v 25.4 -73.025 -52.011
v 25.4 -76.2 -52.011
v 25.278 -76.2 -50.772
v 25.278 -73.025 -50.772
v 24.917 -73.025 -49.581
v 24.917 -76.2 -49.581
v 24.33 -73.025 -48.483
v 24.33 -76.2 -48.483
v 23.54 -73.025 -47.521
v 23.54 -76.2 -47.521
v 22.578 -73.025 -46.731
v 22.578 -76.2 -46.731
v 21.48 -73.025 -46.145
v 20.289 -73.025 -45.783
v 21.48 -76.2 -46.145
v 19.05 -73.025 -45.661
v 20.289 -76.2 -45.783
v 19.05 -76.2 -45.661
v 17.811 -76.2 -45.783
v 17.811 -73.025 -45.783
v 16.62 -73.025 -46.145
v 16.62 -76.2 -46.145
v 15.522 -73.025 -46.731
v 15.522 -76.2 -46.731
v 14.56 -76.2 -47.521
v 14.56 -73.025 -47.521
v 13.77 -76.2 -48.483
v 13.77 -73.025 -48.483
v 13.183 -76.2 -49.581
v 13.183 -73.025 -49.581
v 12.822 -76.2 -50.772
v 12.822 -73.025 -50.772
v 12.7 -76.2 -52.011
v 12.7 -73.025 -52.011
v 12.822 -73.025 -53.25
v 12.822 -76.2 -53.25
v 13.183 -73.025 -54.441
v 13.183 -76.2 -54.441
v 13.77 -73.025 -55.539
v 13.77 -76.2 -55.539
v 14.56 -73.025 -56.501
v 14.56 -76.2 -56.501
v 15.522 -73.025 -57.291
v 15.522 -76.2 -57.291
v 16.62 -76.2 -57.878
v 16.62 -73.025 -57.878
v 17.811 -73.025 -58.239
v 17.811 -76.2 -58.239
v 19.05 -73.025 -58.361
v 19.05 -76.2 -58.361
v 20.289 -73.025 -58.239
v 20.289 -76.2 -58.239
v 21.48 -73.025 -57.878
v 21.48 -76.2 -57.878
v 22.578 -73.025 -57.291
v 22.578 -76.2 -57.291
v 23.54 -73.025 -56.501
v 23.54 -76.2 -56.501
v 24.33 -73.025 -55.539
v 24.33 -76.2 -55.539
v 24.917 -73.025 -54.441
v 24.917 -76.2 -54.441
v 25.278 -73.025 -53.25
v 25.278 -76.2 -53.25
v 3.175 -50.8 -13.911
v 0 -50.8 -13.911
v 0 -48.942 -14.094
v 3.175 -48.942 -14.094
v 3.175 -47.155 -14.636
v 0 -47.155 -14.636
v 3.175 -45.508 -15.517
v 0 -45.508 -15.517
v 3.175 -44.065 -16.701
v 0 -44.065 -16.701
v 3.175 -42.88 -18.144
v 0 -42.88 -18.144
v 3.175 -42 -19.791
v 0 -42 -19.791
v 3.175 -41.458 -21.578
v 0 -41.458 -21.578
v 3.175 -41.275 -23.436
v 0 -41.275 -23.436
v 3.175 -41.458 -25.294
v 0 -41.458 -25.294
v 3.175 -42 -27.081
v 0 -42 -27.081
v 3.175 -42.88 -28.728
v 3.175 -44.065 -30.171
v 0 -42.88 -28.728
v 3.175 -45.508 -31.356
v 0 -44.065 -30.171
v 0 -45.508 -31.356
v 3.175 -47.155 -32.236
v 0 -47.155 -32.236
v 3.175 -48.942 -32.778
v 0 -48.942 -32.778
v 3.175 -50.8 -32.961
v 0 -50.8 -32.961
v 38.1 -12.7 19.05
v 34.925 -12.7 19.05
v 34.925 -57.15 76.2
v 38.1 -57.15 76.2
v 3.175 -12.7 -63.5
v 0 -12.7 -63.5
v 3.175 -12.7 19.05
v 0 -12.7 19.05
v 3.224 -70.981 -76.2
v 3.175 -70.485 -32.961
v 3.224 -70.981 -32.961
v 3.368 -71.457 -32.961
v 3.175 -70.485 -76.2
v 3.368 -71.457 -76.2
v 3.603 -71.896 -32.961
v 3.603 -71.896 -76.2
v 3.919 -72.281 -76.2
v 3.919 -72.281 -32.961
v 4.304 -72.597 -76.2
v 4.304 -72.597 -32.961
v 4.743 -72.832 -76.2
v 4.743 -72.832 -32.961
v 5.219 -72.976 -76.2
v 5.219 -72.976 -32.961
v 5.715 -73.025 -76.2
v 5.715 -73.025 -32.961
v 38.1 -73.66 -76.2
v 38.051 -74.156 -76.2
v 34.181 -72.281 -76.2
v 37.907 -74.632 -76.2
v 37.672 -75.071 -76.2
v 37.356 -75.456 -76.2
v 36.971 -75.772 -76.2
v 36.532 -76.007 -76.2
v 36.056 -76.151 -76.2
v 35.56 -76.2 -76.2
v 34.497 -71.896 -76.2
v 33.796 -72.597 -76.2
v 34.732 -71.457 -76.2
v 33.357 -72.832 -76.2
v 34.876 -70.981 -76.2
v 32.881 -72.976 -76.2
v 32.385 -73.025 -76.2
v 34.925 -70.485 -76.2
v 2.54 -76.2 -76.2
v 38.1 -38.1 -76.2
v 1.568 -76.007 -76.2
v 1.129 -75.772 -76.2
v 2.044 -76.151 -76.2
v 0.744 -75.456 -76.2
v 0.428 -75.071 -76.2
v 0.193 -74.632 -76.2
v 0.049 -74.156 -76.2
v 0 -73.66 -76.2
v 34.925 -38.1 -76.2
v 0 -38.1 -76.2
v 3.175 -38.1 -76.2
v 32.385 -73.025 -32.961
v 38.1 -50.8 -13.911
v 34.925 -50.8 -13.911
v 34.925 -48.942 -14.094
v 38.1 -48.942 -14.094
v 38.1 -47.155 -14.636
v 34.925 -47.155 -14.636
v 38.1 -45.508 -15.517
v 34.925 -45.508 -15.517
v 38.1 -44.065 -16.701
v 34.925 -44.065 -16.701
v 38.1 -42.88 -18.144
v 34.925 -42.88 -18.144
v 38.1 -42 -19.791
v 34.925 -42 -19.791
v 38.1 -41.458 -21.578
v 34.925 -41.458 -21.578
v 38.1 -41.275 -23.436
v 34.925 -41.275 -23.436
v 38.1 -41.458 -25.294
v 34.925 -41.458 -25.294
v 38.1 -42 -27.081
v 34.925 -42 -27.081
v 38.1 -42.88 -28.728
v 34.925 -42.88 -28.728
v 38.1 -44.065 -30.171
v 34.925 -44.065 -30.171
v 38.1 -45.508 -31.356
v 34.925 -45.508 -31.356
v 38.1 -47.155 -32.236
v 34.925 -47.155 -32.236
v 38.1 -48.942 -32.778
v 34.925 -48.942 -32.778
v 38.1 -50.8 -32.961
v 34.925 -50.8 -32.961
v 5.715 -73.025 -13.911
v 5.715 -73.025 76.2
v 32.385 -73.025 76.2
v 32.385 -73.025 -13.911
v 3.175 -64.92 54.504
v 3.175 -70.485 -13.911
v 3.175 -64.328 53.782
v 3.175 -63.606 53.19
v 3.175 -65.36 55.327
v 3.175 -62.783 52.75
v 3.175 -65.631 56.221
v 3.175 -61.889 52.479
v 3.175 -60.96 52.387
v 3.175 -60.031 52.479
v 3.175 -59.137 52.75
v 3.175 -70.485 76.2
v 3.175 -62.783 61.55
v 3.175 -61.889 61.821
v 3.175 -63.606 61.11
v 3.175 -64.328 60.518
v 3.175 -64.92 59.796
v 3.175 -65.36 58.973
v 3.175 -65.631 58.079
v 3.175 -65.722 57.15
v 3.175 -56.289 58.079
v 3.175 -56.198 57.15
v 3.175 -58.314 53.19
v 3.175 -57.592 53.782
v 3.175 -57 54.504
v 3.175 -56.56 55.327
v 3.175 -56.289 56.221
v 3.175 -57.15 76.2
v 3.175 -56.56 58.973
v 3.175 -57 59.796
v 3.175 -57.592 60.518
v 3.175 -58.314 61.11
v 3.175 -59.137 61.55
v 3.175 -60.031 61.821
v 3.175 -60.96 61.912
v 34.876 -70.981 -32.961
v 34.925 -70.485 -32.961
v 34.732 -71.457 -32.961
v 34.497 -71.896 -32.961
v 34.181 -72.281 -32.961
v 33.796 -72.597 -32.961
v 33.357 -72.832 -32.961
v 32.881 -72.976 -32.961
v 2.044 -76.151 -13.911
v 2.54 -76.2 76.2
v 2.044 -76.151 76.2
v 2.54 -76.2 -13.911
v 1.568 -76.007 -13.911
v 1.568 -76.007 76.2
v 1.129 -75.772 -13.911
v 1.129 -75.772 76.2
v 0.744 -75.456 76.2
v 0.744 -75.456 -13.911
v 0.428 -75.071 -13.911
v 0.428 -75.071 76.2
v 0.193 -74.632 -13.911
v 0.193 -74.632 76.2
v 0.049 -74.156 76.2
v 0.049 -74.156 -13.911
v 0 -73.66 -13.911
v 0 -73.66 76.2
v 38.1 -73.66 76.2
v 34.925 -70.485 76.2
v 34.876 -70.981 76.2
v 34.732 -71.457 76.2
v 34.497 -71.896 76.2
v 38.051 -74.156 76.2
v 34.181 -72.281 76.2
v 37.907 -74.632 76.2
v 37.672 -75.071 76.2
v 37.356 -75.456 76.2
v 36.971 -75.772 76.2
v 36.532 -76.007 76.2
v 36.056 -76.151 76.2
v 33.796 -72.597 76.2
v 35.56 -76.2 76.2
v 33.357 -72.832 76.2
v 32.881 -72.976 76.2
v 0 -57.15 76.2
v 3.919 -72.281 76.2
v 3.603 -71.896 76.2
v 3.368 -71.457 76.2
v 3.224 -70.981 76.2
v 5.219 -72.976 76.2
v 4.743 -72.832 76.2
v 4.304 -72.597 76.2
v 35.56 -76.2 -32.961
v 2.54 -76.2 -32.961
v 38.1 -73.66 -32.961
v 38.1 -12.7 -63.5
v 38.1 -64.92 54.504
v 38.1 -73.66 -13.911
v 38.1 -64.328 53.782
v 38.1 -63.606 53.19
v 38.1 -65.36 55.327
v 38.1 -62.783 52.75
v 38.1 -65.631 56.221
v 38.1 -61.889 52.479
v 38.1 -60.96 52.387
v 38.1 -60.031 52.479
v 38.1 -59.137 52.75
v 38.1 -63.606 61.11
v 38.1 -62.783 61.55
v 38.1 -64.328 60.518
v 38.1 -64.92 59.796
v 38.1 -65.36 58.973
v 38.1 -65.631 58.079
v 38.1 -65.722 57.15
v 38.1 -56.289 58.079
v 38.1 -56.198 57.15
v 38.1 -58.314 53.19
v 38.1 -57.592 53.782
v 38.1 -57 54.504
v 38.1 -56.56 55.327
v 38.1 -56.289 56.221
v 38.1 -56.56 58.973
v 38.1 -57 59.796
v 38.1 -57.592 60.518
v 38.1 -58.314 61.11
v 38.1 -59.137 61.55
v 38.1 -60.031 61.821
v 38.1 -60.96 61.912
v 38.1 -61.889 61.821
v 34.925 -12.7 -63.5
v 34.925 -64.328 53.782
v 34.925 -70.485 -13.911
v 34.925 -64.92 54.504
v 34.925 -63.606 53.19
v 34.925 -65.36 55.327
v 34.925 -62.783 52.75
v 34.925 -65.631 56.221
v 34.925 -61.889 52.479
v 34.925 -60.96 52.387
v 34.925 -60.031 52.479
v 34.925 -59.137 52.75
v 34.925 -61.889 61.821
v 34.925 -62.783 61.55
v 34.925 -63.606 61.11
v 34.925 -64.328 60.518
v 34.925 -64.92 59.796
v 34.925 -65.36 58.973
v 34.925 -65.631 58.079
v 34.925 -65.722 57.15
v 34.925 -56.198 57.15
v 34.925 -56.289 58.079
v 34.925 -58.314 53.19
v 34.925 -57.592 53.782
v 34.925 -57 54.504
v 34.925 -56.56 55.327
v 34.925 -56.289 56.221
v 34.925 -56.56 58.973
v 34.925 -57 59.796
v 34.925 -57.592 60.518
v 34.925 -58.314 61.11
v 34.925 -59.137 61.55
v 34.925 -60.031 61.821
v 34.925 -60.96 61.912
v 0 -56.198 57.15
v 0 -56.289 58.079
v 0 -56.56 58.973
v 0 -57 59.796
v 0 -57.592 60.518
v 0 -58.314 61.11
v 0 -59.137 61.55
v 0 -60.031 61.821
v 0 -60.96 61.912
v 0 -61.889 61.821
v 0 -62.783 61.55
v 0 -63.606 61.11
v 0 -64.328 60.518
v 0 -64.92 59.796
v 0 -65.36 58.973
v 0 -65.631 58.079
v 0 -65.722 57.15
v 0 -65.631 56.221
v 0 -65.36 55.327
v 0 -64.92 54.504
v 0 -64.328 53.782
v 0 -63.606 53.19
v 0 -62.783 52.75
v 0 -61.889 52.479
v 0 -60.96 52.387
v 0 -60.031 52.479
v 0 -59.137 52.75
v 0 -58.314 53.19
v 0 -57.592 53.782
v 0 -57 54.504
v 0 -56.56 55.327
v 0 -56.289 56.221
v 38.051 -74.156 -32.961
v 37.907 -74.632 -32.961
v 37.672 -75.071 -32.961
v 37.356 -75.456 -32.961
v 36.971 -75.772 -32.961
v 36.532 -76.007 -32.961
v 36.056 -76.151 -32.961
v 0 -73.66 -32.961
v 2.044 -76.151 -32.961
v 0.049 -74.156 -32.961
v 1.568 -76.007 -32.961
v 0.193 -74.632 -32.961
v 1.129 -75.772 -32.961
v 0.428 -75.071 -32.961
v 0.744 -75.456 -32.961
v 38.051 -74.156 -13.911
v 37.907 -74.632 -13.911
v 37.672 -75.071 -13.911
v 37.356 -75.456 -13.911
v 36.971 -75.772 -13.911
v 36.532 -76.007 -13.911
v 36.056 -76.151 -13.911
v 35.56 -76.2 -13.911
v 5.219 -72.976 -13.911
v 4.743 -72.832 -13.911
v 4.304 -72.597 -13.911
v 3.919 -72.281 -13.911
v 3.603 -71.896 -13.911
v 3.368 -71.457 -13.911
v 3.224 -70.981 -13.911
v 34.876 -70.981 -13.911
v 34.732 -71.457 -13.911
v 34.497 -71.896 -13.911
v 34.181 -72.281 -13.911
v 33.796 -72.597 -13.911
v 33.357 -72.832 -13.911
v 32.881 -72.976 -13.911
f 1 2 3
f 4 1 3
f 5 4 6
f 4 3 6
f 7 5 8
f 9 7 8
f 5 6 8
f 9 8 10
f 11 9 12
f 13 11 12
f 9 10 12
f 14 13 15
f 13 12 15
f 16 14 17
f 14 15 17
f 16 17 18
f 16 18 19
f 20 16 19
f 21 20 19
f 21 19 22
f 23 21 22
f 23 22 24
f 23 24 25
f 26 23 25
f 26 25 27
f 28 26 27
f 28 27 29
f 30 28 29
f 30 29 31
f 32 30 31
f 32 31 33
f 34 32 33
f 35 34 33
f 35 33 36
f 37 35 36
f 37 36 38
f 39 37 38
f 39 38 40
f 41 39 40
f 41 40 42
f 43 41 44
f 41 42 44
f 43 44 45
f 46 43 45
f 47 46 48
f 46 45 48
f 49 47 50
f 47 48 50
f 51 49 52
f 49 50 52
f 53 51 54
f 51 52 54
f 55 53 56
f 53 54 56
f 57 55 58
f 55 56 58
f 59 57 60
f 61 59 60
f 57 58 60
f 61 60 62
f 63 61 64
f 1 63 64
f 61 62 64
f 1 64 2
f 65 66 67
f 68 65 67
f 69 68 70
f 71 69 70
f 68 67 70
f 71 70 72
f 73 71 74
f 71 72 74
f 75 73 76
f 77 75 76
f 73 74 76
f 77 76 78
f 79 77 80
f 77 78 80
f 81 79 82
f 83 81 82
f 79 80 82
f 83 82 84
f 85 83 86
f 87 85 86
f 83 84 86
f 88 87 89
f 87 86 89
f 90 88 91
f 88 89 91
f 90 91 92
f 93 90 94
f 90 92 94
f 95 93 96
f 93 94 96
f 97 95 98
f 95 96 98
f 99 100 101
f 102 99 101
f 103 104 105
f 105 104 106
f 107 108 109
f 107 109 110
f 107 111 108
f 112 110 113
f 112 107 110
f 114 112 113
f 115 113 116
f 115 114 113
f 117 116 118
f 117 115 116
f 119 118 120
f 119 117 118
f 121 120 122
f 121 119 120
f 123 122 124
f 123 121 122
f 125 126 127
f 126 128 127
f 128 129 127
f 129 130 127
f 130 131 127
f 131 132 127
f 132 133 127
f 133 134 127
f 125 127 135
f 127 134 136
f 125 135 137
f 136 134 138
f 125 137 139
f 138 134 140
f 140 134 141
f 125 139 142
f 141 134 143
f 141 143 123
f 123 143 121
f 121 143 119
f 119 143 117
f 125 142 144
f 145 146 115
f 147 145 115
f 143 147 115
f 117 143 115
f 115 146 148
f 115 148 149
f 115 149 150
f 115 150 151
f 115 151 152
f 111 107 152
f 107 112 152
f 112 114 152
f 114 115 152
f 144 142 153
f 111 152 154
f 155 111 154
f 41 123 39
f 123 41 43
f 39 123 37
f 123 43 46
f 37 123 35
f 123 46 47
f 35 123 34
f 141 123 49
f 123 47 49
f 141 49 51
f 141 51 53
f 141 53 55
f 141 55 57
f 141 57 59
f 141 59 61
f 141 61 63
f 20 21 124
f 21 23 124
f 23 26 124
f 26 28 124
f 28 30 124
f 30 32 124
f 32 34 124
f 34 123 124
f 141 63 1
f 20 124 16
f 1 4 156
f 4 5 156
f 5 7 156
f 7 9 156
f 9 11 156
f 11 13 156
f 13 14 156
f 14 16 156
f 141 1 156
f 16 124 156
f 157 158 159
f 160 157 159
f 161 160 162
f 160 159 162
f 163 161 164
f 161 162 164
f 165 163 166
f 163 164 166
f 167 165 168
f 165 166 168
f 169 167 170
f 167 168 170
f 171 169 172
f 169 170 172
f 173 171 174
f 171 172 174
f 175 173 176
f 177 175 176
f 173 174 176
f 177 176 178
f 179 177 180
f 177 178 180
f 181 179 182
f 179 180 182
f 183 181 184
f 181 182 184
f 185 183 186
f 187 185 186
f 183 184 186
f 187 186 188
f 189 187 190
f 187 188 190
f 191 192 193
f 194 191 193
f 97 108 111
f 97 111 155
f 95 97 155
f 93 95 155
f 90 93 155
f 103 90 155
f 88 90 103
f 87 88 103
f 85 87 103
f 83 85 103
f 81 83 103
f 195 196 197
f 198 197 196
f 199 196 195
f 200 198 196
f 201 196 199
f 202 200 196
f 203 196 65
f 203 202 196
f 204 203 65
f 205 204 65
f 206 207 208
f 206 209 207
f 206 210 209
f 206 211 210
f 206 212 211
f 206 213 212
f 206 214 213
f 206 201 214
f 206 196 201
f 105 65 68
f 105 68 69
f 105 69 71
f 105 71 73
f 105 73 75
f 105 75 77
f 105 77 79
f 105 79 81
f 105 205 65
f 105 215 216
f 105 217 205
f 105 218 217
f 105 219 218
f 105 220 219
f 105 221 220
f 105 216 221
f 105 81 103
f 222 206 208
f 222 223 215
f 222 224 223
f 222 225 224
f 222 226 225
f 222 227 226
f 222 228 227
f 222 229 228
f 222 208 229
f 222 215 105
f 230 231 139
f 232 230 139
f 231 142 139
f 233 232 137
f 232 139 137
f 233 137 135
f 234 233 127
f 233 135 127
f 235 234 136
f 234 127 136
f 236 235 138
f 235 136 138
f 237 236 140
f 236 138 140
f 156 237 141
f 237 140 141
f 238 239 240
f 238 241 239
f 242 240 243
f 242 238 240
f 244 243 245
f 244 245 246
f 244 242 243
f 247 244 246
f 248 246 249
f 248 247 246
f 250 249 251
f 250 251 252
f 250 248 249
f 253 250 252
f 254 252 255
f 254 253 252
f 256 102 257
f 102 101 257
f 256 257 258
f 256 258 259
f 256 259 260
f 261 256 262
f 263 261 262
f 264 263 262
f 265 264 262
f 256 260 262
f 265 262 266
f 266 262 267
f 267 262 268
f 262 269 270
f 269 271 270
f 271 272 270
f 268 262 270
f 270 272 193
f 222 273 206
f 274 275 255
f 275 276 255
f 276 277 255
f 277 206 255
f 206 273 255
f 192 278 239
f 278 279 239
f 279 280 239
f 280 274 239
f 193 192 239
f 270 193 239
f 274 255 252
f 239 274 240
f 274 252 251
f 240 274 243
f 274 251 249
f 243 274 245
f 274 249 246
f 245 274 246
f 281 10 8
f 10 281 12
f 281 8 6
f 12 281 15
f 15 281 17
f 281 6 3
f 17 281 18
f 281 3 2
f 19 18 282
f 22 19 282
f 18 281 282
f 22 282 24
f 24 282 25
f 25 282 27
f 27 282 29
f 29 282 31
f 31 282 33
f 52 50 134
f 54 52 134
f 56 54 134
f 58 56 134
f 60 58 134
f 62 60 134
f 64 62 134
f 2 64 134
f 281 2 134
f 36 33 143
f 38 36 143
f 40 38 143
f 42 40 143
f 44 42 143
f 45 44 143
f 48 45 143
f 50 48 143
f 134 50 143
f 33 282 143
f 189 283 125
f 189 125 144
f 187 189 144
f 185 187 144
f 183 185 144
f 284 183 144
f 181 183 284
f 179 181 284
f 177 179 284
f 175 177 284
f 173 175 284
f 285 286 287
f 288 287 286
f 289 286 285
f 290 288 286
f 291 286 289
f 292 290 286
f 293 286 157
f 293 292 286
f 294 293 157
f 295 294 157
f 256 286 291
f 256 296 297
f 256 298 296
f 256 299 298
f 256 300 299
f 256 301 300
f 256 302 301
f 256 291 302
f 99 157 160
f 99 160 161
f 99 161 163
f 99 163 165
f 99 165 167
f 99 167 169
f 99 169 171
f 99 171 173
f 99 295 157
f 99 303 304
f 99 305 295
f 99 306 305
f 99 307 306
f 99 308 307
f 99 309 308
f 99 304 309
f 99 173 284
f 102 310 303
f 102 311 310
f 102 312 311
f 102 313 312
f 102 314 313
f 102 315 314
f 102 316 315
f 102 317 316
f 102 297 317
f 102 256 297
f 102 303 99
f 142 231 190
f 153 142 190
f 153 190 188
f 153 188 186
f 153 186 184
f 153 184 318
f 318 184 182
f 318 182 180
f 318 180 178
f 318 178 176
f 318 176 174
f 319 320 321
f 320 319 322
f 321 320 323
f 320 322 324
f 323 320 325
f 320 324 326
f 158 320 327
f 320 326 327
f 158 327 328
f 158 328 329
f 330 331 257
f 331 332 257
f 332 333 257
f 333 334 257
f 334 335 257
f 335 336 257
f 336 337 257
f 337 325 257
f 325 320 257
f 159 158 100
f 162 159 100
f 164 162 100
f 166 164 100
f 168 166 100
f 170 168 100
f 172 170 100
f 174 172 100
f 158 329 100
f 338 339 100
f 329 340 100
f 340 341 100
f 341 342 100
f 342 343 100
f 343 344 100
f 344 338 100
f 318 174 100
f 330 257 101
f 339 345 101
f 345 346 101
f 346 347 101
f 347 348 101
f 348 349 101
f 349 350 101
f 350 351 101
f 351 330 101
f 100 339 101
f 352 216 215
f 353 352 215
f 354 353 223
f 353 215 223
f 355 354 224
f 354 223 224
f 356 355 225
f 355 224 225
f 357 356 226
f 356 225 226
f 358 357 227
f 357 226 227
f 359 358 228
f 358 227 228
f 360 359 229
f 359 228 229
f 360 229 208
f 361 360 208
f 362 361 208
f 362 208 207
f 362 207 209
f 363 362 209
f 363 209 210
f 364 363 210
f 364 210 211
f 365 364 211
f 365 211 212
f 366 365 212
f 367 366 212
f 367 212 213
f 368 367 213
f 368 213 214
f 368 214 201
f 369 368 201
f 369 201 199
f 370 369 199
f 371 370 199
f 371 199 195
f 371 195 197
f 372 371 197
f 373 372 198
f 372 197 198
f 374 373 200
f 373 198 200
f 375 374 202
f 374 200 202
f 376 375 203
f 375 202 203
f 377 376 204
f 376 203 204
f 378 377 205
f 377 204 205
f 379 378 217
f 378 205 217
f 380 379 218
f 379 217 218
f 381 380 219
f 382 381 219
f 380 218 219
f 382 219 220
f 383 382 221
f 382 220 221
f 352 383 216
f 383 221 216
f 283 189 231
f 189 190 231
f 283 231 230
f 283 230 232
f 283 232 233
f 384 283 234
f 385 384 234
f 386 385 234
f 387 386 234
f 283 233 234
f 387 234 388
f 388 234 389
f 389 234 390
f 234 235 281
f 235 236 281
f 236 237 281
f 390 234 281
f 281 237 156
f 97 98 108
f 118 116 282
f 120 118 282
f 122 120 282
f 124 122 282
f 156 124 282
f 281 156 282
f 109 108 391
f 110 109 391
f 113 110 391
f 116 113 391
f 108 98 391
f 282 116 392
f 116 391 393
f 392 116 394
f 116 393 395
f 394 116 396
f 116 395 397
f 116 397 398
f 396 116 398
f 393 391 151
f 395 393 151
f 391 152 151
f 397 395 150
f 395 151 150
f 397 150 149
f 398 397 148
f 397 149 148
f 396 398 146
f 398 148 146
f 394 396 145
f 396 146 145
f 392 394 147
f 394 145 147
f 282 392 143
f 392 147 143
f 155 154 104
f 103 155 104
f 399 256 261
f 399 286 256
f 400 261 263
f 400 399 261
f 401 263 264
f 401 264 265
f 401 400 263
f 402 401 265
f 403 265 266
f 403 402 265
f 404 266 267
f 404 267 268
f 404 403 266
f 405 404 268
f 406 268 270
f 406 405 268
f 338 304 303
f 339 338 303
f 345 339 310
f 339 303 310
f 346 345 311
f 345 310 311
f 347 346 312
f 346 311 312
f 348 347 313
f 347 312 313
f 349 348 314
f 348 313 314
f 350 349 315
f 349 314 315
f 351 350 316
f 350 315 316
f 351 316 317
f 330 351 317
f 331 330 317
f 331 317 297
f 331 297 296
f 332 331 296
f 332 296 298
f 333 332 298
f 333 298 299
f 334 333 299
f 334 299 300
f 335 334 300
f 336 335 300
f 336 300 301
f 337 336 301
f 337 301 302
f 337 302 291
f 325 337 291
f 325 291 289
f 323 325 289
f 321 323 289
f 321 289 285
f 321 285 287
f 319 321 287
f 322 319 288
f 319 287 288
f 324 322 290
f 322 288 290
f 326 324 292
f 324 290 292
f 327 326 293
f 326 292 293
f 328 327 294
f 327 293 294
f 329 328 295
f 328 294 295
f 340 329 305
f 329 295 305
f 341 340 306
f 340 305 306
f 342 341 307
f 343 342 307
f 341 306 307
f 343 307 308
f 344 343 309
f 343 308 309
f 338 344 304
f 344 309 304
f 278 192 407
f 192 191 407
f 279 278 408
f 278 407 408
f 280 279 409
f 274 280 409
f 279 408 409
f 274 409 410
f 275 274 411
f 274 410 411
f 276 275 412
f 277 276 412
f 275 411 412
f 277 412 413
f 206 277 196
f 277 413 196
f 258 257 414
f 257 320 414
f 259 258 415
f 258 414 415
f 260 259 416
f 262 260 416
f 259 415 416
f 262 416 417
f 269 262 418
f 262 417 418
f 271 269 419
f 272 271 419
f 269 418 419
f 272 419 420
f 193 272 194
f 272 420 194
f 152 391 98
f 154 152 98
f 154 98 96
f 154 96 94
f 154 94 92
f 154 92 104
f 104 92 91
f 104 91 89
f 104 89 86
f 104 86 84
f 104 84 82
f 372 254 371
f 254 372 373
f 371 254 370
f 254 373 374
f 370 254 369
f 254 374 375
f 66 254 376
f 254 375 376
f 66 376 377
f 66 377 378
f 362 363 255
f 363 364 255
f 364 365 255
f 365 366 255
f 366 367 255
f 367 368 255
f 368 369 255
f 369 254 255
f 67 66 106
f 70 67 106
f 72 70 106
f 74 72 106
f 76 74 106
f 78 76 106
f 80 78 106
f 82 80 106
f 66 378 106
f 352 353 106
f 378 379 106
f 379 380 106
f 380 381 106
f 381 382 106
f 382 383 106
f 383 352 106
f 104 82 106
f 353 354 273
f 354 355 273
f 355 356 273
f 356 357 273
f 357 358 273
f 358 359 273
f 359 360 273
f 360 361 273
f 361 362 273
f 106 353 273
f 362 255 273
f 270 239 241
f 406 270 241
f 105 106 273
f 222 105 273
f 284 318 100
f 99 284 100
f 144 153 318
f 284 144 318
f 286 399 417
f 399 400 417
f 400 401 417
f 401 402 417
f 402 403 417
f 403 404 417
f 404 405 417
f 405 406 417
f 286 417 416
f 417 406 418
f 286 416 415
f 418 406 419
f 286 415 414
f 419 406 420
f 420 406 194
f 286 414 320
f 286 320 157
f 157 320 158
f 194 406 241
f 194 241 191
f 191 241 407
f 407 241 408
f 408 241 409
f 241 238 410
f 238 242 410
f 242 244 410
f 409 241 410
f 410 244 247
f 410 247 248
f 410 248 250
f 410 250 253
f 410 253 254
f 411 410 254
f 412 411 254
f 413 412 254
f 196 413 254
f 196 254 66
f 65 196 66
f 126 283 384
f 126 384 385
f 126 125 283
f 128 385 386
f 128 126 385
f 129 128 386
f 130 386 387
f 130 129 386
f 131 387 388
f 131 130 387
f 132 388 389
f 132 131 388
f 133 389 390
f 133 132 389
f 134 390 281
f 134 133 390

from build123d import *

# Parameters (mm, degrees)
F1_DEPTH = 38.1
F2_W     = 31.75
F2_H     = 73.025
F3_DEPTH = 152.401
F4_R     = 2.54
F5_R     = 2.54
F6_R     = 6.35
F7_DEPTH = 25.4
F8_R     = 4.7625
F9_DEPTH = 38.101


with BuildPart() as f1:
    # F0 (on Right) → F1 (new body)
    with BuildSketch(Plane.YZ):
        with BuildLine():
            Line((-57.15, 76.2), (-76.2, 76.2))
            Line((-76.2, 76.2), (-76.2, -13.9112576244))
            Line((-76.2, -13.9112576244), (-50.8, -13.9112576244))
            ThreePointArc((-50.8, -13.9112576244), (-41.275, -23.4362576244), (-50.8, -32.9612576244))
            Line((-50.8, -32.9612576244), (-76.2, -32.9612576244))
            Line((-76.2, -32.9612576244), (-76.2, -76.2))
            Line((-76.2, -76.2), (-38.1, -76.2))
            Line((-38.1, -76.2), (-12.7, -63.5))
            Line((-12.7, -63.5), (-12.7, 19.05))
            Line((-12.7, 19.05), (-57.15, 76.2))
        make_face()
    extrude(amount=F1_DEPTH)

    # F2 (on face) → F3 (cut, through all)
    with BuildSketch(Plane.XY.offset(76.2)):
        with Locations((19.05, -36.5125)):
            Rectangle(F2_W, F2_H)
    extrude(amount=-F3_DEPTH, mode=Mode.SUBTRACT)

    # F4
    f4_edges = [f1.edges().sort_by_distance(p)[0] for p in [
        (3.175, -73.025, 31.144371),
        (34.925, -73.025, 31.144371),
        (34.925, -73.025, -54.580629),
        (3.175, -73.025, -54.580629),
    ]]
    fillet(f4_edges, radius=F4_R)

    # F5
    f5_edges = [f1.edges().sort_by_distance(p)[0] for p in [
        (38.1, -76.2, -54.580629),
        (0, -76.2, -54.580629),
        (0, -76.2, 31.144371),
        (38.1, -76.2, 31.144371),
    ]]
    fillet(f5_edges, radius=F5_R)

    # F6 (on face) → F7 (cut)
    with BuildSketch(Plane.XZ.offset(76.2)):
        with Locations((19.05, -52.0112576244)):
            Circle(F6_R)
    extrude(amount=-F7_DEPTH, mode=Mode.SUBTRACT)

    # F8 (on face) → F9 (cut, through all)
    with BuildSketch(Plane.YZ.offset(38.1)):
        with Locations((-60.96, 57.15)):
            Circle(F8_R)
    extrude(amount=-F9_DEPTH, mode=Mode.SUBTRACT)


solid = f1.part
